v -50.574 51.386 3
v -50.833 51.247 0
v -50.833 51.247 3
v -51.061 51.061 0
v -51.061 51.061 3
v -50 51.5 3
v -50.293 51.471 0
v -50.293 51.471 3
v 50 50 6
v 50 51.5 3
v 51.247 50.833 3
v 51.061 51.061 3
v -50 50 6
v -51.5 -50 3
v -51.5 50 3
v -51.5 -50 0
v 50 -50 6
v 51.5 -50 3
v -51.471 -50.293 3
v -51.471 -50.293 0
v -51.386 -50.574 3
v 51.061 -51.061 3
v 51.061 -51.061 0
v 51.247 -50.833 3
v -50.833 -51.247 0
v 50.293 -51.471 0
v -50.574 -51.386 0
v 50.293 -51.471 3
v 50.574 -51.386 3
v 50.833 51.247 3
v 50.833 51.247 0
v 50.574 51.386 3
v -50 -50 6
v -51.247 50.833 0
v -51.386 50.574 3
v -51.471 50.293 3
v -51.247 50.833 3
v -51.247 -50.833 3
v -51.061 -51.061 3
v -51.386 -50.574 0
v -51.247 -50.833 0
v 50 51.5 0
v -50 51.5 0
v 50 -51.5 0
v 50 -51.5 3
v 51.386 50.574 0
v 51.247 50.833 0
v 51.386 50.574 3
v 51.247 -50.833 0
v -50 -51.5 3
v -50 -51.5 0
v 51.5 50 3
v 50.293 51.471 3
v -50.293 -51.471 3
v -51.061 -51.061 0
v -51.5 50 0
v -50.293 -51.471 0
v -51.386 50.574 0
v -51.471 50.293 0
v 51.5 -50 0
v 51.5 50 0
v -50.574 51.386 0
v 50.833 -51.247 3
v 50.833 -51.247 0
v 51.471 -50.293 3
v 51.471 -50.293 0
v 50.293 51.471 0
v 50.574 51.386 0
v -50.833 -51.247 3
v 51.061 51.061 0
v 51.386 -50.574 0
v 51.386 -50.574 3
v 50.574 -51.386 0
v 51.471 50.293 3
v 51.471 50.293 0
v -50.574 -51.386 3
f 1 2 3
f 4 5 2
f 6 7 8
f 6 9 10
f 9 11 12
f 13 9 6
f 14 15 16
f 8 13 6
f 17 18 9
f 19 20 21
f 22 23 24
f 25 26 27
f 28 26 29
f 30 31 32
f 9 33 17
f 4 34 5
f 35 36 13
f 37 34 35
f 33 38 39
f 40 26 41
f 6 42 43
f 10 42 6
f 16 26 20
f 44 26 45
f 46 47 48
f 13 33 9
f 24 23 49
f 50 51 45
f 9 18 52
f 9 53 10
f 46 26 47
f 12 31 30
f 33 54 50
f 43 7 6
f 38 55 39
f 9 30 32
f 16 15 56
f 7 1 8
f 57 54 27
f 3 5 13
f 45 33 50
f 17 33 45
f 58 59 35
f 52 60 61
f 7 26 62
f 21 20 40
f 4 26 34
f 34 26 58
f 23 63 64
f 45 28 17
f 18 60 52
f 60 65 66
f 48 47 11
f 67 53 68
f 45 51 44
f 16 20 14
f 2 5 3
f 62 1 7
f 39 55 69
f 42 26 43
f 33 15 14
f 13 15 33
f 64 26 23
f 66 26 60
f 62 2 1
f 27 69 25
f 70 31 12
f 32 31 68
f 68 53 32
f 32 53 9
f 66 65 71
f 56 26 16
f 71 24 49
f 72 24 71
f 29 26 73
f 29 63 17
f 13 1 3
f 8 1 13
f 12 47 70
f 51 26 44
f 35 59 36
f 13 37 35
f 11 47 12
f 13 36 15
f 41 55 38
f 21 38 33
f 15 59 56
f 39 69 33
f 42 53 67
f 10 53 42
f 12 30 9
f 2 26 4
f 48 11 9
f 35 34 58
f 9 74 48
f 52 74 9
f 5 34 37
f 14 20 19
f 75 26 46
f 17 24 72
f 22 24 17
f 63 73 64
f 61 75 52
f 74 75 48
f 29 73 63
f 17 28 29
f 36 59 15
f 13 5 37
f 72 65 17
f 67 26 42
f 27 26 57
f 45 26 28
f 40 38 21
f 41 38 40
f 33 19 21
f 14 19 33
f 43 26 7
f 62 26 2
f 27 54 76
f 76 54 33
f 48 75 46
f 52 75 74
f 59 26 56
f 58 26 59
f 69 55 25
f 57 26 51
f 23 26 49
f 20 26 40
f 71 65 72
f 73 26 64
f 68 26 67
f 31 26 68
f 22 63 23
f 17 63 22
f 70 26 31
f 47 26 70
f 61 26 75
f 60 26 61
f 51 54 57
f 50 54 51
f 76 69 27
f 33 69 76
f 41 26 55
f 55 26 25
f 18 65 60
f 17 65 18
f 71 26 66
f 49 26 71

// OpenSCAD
module mCube(x,y,z){
    translate([-x,-y,0]/2)cube([x,y,z]);
}

module thick_rectangle(inner_length, inner_width, border_width, height){
    difference(){
        mCube(inner_length + border_width,inner_width + border_width, height);
        mCube(inner_length,inner_width,height);
    }
}

module prism(l, w, h){
   polyhedron(
           points=[[0,0,0], [l,0,0], [l,w,0], [0,w,0], [0,w,h], [l,w,h]],
           faces=[[0,1,2,3],[5,4,3,2],[0,4,5,1],[0,3,4],[5,2,1]]
           );
}


module square3D(width, length, height, thickness, inner=false){
    if(inner){
        difference(){
            mCube(width+thickness*2,length+thickness*2,height);
            mCube(width, length, height);
            
        }
    }
    else{
        difference(){
            mCube(width,length,height);
            mCube(width-thickness*2, length-thickness*2, height);
            
        }
    }
}


module cropped_triangle(size,center=false){
    
    if(center){
        translate(-size/2)
        difference(){
            cube(size);
            cylinder(h=size[2],r=size[0]);
        }
    }else{
        difference(){
            cube(size);
            cylinder(h=size[2],r=size[0]);
        }
    }
}


module round_rectangle(L,w,h=10){
    
    hull(){
        translate([0,-L/2,0])cylinder(h=h,d=w);
        translate([0,L/2,0])cylinder(h=h,d=w);
    }
}

module u_shape(length,width,thickness,height){
    
    linear_extrude(length-height){
        square([width - height,thickness], center=true);
        
        translate([-width/2+thickness/sqrt(2),-height/2-0.42,0])rotate([0,0,45])square([height/sqrt(2),thickness]);
        mirror([1,0,0])translate([-width/2+thickness/sqrt(2),-height/2-0.42,0])rotate([0,0,45])square([height/sqrt(2),thickness]);
        
        //translate([-width/2,-height+thickness/2,0])square([thickness,height/2]);
        //mirror([1,0,0])translate([-width/2,-height+thickness/2,0])square([thickness,height/2]);
    }
    
}

// Function to create a rectangle with chamfered edges
module chamfered_rectangle(length, width, height, chamfer_size) {
    minkowski() {
        // The base rectangle
        mCube(length, width, height);
        
        // A small cylinder to chamfer the edges
        cylinder(h = chamfer_size, r1 = chamfer_size / 2, r2 = 0, $fn = 32);
    }
}


chamfered_rectangle(100,100,3,3);

// Function to create a chamfered thick rectangular border (empty inside)
module chamfered_thick_rectangle(outer_length, outer_width, border_width, chamfer_size) {
    difference() {
        // Outer rectangle with chamfered edges
        minkowski() {
            cube([outer_length - chamfer_size, outer_width - chamfer_size, border_width]); // Base outer rectangle
            translate([chamfer_size / 2, chamfer_size / 2, 0])
                cube([chamfer_size, chamfer_size, chamfer_size]); // Small cube for chamfering
        }
        
        // Inner cutout to make it an empty rectangle
        translate([border_width/2, border_width/2, -0.1]) // Ensure it fully overlaps
            cube([outer_length - 2*border_width, outer_width - 2*border_width, border_width + 0.2]);
    }
}
